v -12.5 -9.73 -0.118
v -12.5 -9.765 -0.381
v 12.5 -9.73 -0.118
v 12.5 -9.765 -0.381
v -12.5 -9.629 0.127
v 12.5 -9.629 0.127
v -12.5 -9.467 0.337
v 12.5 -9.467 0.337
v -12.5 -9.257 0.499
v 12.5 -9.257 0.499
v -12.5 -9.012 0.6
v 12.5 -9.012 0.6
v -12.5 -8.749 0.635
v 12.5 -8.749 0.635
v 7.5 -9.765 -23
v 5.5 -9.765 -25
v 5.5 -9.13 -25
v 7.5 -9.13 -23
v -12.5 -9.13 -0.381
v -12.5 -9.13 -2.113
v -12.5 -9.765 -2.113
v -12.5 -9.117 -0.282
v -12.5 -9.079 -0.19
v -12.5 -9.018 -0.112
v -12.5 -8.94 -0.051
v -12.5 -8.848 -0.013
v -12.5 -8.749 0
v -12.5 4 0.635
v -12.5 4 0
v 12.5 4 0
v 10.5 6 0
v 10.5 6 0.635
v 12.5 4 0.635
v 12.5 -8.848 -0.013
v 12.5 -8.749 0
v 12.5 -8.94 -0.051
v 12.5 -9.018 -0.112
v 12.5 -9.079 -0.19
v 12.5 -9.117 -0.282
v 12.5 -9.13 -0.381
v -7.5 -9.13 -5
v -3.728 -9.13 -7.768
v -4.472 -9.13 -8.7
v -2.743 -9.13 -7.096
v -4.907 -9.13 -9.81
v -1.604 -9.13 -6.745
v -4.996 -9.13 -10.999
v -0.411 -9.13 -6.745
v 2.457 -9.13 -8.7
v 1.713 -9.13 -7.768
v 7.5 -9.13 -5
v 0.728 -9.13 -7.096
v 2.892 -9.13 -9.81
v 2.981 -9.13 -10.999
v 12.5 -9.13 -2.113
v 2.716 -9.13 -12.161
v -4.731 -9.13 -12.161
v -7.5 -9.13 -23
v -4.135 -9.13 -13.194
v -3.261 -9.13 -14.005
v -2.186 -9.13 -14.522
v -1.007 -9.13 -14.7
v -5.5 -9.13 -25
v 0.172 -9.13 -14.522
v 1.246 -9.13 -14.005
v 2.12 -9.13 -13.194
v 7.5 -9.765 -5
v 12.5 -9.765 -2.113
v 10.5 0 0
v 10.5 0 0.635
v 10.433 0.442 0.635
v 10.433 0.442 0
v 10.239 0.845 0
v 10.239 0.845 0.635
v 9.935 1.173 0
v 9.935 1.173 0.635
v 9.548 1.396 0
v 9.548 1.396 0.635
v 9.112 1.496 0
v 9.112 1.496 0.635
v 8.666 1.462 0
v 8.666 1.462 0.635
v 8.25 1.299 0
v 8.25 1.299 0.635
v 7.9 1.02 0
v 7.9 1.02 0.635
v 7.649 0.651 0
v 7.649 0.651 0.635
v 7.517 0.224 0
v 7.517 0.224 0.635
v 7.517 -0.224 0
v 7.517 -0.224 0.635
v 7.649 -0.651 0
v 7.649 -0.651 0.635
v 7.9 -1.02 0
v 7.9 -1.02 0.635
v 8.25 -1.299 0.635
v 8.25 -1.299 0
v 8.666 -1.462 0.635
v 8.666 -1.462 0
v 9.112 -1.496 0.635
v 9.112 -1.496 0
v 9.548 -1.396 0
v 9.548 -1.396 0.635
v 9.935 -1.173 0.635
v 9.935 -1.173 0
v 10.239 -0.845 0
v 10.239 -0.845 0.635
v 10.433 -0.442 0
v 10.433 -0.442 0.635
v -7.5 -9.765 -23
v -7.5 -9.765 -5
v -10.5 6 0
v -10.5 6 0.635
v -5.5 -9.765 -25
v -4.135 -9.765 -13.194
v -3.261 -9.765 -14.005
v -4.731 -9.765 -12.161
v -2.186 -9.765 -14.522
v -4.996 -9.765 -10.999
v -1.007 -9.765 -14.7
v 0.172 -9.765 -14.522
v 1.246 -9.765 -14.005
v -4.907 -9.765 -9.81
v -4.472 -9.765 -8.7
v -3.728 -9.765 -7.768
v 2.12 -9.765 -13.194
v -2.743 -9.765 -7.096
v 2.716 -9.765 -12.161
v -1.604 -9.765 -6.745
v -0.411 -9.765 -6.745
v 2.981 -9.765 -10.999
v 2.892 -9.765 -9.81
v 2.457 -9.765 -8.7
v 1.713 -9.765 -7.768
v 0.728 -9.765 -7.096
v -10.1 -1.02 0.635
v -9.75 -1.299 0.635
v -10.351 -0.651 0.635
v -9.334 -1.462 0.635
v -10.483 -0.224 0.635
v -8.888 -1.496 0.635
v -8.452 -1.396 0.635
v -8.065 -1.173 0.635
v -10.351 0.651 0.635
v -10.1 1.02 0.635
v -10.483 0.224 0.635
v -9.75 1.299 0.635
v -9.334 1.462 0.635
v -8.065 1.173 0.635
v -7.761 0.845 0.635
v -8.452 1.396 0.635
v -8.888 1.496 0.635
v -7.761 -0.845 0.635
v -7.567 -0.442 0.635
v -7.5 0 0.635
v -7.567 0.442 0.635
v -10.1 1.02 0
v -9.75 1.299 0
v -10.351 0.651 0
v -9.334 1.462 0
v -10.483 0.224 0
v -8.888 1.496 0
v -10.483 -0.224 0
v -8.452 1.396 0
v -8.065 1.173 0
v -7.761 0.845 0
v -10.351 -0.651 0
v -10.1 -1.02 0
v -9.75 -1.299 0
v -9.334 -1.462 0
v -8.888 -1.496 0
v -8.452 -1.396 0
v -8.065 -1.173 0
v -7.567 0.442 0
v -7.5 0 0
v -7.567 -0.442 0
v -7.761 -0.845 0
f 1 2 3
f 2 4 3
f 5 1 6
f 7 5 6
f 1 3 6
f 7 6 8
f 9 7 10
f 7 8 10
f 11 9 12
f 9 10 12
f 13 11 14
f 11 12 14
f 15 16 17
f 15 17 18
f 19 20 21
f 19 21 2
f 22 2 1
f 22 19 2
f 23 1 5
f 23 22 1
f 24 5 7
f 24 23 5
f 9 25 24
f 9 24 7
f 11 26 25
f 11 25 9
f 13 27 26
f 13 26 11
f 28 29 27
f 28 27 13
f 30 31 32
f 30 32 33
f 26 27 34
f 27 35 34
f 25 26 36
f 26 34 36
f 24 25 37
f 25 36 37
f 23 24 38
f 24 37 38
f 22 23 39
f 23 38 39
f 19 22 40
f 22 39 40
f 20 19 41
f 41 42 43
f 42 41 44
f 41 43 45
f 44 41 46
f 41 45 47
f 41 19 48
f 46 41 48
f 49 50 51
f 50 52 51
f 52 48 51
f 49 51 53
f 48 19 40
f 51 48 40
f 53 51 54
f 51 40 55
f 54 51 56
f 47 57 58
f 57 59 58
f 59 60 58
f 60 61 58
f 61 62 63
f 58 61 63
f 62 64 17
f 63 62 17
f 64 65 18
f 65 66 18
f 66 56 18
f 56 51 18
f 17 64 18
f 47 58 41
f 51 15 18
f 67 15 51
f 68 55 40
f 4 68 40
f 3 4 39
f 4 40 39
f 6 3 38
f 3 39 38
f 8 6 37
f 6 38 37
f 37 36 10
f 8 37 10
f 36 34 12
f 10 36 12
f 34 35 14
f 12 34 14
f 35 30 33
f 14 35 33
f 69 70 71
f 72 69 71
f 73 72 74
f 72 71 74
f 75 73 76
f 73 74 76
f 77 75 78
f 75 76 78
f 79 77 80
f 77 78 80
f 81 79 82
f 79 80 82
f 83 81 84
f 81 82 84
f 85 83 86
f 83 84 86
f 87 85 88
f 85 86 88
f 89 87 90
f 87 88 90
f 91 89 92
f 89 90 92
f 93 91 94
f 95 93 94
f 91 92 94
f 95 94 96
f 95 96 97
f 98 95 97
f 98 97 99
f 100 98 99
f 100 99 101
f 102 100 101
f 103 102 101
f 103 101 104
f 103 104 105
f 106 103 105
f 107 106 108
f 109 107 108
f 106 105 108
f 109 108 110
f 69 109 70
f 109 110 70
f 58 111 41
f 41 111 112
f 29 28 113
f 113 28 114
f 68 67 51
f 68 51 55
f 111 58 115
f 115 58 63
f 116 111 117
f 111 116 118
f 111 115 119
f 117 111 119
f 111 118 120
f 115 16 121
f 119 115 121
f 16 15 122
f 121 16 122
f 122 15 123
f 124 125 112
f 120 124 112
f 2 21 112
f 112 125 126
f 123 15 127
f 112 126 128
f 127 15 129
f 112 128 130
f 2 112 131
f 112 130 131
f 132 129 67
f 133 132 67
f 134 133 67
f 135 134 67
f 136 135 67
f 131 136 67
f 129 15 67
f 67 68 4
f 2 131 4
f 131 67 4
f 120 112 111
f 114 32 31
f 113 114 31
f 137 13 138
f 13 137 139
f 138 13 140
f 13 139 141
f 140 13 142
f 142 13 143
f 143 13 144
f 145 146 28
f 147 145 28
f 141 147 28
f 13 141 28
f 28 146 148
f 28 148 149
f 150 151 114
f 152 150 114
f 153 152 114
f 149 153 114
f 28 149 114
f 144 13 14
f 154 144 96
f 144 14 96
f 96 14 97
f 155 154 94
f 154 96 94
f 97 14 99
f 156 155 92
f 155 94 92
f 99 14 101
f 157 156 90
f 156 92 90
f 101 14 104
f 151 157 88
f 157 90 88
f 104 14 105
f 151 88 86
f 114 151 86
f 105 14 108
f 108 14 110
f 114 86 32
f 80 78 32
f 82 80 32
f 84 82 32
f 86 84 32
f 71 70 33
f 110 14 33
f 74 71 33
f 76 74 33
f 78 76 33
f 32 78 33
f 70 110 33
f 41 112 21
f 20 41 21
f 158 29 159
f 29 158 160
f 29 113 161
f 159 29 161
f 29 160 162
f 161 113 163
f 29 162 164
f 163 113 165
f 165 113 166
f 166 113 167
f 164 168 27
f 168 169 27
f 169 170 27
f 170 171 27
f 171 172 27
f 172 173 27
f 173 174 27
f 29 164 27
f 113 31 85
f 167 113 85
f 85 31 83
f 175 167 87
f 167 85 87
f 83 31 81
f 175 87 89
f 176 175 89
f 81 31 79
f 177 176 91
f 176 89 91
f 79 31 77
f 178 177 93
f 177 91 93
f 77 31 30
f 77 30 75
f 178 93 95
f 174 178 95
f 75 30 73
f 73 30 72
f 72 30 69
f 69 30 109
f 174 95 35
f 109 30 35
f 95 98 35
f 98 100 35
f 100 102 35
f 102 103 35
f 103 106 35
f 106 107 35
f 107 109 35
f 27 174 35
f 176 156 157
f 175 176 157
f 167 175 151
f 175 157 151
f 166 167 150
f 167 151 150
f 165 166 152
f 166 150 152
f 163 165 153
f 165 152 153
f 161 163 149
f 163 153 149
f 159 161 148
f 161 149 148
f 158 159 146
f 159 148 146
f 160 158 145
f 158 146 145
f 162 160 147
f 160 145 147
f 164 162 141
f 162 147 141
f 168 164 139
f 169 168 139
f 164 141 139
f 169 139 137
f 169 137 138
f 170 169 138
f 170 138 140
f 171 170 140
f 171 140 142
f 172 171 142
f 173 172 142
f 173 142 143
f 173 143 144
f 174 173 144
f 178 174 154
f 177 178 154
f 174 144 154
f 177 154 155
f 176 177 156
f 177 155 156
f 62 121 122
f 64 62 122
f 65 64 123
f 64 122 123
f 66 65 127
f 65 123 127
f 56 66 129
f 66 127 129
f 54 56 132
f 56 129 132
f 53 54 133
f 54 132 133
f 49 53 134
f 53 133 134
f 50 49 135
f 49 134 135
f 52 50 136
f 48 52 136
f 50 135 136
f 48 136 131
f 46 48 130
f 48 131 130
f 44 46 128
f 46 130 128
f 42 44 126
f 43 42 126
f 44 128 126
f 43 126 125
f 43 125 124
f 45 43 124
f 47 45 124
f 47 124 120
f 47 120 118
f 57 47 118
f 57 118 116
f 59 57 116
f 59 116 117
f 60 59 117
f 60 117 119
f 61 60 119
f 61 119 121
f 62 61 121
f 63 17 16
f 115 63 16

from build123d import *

# Parameters (mm, degrees)
BASE_FLANGE1_DEPTH        = 12.5
SKETCH7_R                 = 4
CUT_EXTRUDE1_DEPTH        = 10
SKETCH8_R                 = 1.5
CUT_EXTRUDE2_DEPTH        = 0.635
BREAK_CORNER1_START       = 11.66726189
BREAK_CORNER1_OUTLINE_W   = 6
BREAK_CORNER1_OUTLINE_H   = 3
BREAK_CORNER1_DEPTH       = 1.414213562
BREAK_CORNER1_START_2     = 21.566756826
BREAK_CORNER1_2_OUTLINE_W = 14
BREAK_CORNER1_2_OUTLINE_H = 3
BREAK_CORNER1_2_DEPTH     = 1.414213563
BREAK_CORNER1_START_3     = -22.980970389
BREAK_CORNER1_3_OUTLINE_W = 14
BREAK_CORNER1_3_OUTLINE_H = 3
BREAK_CORNER1_3_DEPTH     = 1.414213563
BREAK_CORNER1_START_4     = -13.081475452
BREAK_CORNER1_4_OUTLINE_W = 6
BREAK_CORNER1_4_OUTLINE_H = 3
BREAK_CORNER1_4_DEPTH     = 1.414213562


# Read off the part's stored shape, not the designer's step: Break-Corner1
# Sheet-metal steps are written as plain solids
with BuildPart() as part:
    # Sketch2 → Base-Flange1 (new, symmetric)
    with BuildSketch(Plane(origin=(0, 0, 0), x_dir=(0, 0, -1), z_dir=(1, 0, 0))):
        with BuildLine():
            Line((0, 6), (0, -8.749))
            ThreePointArc((0, -8.749), (0.111592316, -9.018407684), (0.381, -9.13))
            Line((0.381, -9.13), (25, -9.13))
            Line((25, -9.13), (25, -9.765))
            Line((25, -9.765), (0.381, -9.765))
            ThreePointArc((0.381, -9.765), (-0.33742049, -9.46742049), (-0.635, -8.749))
            Line((-0.635, -8.749), (-0.635, 6))
            Line((-0.635, 6), (0, 6))
        make_face()
    extrude(amount=BASE_FLANGE1_DEPTH, both=True)

    # Sketch7 → Cut-Extrude1 (cut)
    with BuildSketch(Plane.XZ.offset(9.765)):
        with Locations(Location((-1.007441433, -10.7, 0), (0, 0, 270))):
            Circle(SKETCH7_R)
        Polygon((7.5, -25), (7.5, -5), (12.5, -2.113248654), (12.5, -25), align=None)
        Polygon((-7.5, -25), (-7.5, -5), (-12.5, -2.113248654), (-12.5, -25), align=None)
    extrude(amount=-CUT_EXTRUDE1_DEPTH, mode=Mode.SUBTRACT)

    # Sketch8 → Cut-Extrude2 (cut)
    with BuildSketch(Plane.XY.offset(0.635)):
        with Locations((9, 0)):
            Circle(SKETCH8_R)
        with Locations((-9, 0)):
            Circle(SKETCH8_R)
    extrude(amount=-CUT_EXTRUDE2_DEPTH, mode=Mode.SUBTRACT)

    # Break-Corner1 outline → Break-Corner1 (cut)
    with BuildSketch(Plane(origin=(0, 0, 0), x_dir=(0.7071067811865474, -0.7071067811865477, 0), z_dir=(0.7071067811865476, 0.7071067811865476, 0)).offset(BREAK_CORNER1_START)):
        with Locations((5, -0.5)):
            Rectangle(BREAK_CORNER1_OUTLINE_W, BREAK_CORNER1_OUTLINE_H)
    extrude(amount=BREAK_CORNER1_DEPTH, mode=Mode.SUBTRACT)

    # Break-Corner1 2 outline → Break-Corner1 2 (cut)
    with BuildSketch(Plane(origin=(0, 0, 0), x_dir=(0.707106781186548, 0, 0.707106781186547), z_dir=(0.707106781186547, 0, -0.707106781186548)).offset(BREAK_CORNER1_START_2)):
        with Locations((-16, 9.5)):
            Rectangle(BREAK_CORNER1_2_OUTLINE_W, BREAK_CORNER1_2_OUTLINE_H)
    extrude(amount=BREAK_CORNER1_2_DEPTH, mode=Mode.SUBTRACT)

    # Break-Corner1 3 outline → Break-Corner1 3 (cut)
    with BuildSketch(Plane(origin=(0, 0, 0), x_dir=(0.7071067811865474, 0, -0.7071067811865477), z_dir=(0.7071067811865476, 0, 0.7071067811865476)).offset(BREAK_CORNER1_START_3)):
        with Locations((16, -9.5)):
            Rectangle(BREAK_CORNER1_3_OUTLINE_W, BREAK_CORNER1_3_OUTLINE_H)
    extrude(amount=BREAK_CORNER1_3_DEPTH, mode=Mode.SUBTRACT)

    # Break-Corner1 4 outline → Break-Corner1 4 (cut)
    with BuildSketch(Plane(origin=(0, 0, 0), x_dir=(0.707106781186548, 0.707106781186547, 0), z_dir=(0.707106781186547, -0.707106781186548, 0)).offset(BREAK_CORNER1_START_4)):
        with Locations((-5, 0.5)):
            Rectangle(BREAK_CORNER1_4_OUTLINE_W, BREAK_CORNER1_4_OUTLINE_H)
    extrude(amount=BREAK_CORNER1_4_DEPTH, mode=Mode.SUBTRACT)


solid = part.part
